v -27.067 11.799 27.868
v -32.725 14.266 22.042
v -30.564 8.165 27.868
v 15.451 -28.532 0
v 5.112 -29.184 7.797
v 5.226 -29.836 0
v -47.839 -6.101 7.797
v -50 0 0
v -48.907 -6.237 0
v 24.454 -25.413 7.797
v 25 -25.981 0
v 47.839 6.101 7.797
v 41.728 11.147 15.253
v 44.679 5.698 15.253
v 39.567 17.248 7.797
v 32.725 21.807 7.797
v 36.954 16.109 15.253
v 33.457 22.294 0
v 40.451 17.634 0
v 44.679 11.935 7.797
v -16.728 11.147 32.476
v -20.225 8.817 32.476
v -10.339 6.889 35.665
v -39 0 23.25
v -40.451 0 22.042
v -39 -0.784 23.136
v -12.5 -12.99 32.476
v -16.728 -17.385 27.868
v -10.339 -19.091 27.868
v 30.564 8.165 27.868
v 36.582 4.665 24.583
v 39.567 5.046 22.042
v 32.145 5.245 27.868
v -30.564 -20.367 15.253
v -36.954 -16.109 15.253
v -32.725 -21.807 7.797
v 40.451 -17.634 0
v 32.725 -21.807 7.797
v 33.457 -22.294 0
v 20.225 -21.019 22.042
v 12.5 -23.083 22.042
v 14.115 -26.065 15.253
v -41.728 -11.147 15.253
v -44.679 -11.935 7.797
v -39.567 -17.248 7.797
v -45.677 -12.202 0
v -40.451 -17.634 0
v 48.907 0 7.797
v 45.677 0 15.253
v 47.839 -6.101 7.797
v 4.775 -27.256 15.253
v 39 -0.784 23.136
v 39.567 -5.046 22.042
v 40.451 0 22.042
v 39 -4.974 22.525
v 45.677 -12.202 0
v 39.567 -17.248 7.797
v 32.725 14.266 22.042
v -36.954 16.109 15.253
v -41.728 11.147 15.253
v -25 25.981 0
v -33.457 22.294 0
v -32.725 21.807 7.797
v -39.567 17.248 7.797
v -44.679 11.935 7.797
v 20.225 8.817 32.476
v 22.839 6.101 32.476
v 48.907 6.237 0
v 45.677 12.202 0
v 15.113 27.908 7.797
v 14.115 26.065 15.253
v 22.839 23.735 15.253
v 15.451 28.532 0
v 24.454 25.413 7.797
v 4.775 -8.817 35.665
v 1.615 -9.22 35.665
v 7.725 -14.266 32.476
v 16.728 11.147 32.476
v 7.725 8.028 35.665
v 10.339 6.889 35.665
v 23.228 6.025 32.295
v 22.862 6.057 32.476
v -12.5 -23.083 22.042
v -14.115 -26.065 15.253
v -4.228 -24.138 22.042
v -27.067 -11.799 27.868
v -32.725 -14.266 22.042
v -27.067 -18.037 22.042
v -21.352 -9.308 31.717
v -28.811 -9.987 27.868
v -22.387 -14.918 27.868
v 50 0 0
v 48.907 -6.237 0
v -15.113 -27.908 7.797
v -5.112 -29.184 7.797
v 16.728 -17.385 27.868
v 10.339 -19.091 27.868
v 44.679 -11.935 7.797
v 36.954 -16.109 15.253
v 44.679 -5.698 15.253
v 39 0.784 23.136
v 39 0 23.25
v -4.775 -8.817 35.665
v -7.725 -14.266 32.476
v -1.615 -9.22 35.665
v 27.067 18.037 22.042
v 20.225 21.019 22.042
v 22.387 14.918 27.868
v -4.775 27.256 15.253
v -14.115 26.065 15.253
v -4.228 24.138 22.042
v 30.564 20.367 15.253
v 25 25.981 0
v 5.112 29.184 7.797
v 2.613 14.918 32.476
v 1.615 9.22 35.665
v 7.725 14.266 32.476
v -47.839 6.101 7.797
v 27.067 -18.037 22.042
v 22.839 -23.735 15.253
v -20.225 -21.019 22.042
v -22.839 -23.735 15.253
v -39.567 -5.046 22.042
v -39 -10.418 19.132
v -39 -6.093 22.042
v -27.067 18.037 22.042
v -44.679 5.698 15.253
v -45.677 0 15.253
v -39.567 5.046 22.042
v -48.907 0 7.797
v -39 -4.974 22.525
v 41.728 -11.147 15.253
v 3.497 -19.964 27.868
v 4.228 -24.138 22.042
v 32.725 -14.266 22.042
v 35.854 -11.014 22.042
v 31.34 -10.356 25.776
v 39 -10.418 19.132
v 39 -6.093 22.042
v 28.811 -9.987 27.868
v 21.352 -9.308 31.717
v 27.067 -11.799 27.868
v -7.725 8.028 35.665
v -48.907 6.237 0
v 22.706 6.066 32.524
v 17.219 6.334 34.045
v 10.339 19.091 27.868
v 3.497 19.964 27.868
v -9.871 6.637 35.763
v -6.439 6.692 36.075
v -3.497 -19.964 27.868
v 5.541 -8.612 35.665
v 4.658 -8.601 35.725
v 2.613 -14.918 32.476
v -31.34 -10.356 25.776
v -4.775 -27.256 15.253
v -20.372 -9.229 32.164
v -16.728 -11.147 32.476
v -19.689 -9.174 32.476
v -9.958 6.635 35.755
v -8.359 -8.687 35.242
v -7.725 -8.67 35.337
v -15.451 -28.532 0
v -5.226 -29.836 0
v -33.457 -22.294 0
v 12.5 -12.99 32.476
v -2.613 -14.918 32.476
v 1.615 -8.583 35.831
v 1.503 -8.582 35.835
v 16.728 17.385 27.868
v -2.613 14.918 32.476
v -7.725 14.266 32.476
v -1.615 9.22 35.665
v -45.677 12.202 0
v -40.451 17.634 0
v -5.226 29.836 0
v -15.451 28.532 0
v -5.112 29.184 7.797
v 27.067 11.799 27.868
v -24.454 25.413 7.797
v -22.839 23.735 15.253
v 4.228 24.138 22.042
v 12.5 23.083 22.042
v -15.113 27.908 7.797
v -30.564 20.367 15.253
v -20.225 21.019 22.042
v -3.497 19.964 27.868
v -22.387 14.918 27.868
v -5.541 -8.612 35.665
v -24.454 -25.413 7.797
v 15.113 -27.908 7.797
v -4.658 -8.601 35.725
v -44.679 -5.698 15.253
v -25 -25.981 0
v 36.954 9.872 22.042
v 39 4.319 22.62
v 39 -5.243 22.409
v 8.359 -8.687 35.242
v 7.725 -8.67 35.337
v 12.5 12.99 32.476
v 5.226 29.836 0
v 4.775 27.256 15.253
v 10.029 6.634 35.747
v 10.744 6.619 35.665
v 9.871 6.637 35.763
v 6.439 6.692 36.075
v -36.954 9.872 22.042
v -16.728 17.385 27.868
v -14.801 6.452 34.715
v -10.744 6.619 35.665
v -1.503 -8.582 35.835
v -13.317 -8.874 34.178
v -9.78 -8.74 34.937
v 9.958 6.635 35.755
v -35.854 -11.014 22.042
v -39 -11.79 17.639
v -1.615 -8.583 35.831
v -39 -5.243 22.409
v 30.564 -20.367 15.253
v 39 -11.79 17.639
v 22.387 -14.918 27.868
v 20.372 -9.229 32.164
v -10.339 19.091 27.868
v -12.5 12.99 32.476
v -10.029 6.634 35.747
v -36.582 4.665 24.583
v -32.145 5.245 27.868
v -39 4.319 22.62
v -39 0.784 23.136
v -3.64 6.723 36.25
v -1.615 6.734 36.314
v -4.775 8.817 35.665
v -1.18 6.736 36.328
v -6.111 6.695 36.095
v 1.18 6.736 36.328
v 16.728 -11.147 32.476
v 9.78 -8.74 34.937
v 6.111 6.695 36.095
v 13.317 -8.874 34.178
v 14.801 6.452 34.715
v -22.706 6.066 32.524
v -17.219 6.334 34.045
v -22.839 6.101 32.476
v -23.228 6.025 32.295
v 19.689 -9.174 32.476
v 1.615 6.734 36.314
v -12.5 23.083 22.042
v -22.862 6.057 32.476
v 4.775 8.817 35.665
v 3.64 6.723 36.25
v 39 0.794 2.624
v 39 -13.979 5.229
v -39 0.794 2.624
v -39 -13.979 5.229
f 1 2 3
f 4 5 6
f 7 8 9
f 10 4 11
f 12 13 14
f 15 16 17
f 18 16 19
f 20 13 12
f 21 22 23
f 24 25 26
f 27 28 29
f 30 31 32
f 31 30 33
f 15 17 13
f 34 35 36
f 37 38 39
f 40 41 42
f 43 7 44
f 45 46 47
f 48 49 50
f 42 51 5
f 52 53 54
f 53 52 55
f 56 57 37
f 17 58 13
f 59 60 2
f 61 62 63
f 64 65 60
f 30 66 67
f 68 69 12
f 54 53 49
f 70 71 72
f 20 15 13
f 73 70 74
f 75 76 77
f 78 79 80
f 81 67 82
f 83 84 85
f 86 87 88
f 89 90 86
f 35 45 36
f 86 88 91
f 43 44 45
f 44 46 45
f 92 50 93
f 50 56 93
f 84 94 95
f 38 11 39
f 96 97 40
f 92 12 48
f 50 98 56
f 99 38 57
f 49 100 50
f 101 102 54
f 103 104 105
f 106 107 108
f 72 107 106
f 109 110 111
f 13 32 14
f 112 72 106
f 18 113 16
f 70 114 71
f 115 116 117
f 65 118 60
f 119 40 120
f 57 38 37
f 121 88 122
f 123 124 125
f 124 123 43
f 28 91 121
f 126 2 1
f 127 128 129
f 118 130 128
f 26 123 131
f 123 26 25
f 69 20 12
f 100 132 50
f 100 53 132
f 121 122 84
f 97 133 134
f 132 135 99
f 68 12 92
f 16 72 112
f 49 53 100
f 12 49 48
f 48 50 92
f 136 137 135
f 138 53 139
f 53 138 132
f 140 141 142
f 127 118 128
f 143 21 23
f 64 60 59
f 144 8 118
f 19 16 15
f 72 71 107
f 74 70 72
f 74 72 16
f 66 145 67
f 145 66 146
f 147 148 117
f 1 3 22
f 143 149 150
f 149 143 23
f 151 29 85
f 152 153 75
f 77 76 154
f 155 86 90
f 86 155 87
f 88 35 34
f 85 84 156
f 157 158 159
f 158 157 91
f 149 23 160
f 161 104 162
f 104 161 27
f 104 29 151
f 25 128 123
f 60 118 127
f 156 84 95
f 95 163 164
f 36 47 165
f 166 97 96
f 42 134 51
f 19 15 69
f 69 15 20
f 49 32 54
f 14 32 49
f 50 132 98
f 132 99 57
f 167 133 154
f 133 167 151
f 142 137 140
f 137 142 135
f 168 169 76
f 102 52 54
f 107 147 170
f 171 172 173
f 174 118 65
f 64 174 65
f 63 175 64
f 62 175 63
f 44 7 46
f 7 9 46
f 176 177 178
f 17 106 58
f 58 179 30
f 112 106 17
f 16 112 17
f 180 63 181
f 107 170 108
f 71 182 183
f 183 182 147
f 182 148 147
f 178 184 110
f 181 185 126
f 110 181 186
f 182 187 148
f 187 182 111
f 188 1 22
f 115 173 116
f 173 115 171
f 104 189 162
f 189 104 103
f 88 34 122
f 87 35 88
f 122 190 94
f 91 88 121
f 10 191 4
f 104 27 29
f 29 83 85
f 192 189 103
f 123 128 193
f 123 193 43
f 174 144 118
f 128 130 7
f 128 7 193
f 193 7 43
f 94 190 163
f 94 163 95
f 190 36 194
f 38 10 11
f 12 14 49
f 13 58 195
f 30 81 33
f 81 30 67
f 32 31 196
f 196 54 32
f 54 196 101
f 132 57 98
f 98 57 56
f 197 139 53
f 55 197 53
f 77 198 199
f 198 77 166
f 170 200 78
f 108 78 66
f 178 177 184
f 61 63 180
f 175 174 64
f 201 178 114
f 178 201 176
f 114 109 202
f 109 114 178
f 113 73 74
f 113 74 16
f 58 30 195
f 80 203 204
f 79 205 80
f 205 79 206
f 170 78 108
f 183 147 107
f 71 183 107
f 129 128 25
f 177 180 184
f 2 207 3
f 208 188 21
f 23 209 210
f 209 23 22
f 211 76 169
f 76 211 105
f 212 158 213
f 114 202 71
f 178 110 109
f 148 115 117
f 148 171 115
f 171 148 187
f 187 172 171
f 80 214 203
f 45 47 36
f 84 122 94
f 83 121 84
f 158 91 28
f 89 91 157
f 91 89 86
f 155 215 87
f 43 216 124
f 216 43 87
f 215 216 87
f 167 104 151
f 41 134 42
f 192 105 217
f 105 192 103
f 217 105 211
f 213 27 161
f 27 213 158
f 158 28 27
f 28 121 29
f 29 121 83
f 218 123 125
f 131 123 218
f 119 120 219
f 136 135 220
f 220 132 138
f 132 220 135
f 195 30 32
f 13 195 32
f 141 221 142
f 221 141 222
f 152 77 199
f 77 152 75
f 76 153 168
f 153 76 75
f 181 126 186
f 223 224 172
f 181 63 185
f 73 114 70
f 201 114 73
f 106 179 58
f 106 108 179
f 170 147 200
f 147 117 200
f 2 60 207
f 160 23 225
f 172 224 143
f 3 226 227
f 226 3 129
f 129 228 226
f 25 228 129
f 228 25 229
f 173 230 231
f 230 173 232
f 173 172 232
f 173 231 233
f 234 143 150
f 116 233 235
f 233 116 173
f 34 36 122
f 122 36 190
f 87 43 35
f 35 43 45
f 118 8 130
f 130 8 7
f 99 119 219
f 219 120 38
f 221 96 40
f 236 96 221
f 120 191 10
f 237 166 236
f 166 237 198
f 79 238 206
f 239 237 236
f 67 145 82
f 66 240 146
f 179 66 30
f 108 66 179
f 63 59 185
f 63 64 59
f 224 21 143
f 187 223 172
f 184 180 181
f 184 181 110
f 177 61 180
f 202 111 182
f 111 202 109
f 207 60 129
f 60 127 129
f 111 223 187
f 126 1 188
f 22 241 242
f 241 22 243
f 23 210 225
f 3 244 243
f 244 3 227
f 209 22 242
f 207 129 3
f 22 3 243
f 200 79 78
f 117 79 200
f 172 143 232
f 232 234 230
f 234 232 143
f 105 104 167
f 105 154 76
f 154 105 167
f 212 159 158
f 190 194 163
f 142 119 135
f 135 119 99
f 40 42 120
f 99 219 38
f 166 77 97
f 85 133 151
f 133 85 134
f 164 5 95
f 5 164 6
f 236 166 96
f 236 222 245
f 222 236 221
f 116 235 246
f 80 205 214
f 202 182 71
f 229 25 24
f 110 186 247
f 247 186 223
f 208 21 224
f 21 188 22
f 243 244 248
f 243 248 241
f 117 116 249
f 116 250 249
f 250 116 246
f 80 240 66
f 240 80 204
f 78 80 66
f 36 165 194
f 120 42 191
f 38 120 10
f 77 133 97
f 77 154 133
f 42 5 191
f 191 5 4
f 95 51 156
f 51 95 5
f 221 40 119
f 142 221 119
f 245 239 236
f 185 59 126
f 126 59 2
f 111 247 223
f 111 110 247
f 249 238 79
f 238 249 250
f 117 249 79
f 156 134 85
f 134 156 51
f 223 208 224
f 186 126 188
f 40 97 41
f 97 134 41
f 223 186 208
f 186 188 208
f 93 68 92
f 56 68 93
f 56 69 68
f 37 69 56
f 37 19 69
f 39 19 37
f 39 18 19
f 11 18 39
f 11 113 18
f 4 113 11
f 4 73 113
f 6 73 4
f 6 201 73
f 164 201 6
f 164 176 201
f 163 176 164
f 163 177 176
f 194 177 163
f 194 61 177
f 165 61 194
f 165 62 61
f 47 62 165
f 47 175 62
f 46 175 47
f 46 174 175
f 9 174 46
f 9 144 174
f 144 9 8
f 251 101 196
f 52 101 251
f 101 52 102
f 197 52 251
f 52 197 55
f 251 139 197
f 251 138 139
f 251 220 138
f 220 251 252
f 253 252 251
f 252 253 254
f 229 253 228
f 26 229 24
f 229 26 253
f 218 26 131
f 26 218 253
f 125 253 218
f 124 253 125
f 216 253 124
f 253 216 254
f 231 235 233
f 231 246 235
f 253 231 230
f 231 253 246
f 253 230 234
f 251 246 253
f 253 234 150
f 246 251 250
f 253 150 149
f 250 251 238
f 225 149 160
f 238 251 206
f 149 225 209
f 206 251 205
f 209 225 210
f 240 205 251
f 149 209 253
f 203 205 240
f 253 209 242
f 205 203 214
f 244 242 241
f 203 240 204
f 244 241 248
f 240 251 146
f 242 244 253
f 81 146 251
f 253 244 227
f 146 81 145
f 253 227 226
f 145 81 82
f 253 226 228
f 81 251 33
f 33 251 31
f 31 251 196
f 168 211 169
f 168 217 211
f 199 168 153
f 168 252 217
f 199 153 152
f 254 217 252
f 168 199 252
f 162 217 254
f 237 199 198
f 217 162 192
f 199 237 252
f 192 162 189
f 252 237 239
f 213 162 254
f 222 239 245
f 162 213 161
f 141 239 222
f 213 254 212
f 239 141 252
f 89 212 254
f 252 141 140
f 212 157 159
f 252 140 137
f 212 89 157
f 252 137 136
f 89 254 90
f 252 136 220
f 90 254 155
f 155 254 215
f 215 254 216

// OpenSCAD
/*
 * Copyright (C) 2019 Marco Lochen
 *
 * This work is licensed under the Creative Commons Attribution 4.0
 * International License. To view a copy of this license, visit
 * http://creativecommons.org/licenses/by/4.0/ or send a letter to Creative
 * Commons, PO Box 1866, Mountain View, CA 94042, USA.
 */

difference()
{
    intersection()
    {
        scale([1, 0.6, 0.75]) sphere(r = 50);
        translate([0, 0, 100]) cube([200, 200, 200], center = true);
    }
    #translate([0, 4, 64]) rotate([-10, 0, 0]) cube([78, 15, 122], center = true);
}
